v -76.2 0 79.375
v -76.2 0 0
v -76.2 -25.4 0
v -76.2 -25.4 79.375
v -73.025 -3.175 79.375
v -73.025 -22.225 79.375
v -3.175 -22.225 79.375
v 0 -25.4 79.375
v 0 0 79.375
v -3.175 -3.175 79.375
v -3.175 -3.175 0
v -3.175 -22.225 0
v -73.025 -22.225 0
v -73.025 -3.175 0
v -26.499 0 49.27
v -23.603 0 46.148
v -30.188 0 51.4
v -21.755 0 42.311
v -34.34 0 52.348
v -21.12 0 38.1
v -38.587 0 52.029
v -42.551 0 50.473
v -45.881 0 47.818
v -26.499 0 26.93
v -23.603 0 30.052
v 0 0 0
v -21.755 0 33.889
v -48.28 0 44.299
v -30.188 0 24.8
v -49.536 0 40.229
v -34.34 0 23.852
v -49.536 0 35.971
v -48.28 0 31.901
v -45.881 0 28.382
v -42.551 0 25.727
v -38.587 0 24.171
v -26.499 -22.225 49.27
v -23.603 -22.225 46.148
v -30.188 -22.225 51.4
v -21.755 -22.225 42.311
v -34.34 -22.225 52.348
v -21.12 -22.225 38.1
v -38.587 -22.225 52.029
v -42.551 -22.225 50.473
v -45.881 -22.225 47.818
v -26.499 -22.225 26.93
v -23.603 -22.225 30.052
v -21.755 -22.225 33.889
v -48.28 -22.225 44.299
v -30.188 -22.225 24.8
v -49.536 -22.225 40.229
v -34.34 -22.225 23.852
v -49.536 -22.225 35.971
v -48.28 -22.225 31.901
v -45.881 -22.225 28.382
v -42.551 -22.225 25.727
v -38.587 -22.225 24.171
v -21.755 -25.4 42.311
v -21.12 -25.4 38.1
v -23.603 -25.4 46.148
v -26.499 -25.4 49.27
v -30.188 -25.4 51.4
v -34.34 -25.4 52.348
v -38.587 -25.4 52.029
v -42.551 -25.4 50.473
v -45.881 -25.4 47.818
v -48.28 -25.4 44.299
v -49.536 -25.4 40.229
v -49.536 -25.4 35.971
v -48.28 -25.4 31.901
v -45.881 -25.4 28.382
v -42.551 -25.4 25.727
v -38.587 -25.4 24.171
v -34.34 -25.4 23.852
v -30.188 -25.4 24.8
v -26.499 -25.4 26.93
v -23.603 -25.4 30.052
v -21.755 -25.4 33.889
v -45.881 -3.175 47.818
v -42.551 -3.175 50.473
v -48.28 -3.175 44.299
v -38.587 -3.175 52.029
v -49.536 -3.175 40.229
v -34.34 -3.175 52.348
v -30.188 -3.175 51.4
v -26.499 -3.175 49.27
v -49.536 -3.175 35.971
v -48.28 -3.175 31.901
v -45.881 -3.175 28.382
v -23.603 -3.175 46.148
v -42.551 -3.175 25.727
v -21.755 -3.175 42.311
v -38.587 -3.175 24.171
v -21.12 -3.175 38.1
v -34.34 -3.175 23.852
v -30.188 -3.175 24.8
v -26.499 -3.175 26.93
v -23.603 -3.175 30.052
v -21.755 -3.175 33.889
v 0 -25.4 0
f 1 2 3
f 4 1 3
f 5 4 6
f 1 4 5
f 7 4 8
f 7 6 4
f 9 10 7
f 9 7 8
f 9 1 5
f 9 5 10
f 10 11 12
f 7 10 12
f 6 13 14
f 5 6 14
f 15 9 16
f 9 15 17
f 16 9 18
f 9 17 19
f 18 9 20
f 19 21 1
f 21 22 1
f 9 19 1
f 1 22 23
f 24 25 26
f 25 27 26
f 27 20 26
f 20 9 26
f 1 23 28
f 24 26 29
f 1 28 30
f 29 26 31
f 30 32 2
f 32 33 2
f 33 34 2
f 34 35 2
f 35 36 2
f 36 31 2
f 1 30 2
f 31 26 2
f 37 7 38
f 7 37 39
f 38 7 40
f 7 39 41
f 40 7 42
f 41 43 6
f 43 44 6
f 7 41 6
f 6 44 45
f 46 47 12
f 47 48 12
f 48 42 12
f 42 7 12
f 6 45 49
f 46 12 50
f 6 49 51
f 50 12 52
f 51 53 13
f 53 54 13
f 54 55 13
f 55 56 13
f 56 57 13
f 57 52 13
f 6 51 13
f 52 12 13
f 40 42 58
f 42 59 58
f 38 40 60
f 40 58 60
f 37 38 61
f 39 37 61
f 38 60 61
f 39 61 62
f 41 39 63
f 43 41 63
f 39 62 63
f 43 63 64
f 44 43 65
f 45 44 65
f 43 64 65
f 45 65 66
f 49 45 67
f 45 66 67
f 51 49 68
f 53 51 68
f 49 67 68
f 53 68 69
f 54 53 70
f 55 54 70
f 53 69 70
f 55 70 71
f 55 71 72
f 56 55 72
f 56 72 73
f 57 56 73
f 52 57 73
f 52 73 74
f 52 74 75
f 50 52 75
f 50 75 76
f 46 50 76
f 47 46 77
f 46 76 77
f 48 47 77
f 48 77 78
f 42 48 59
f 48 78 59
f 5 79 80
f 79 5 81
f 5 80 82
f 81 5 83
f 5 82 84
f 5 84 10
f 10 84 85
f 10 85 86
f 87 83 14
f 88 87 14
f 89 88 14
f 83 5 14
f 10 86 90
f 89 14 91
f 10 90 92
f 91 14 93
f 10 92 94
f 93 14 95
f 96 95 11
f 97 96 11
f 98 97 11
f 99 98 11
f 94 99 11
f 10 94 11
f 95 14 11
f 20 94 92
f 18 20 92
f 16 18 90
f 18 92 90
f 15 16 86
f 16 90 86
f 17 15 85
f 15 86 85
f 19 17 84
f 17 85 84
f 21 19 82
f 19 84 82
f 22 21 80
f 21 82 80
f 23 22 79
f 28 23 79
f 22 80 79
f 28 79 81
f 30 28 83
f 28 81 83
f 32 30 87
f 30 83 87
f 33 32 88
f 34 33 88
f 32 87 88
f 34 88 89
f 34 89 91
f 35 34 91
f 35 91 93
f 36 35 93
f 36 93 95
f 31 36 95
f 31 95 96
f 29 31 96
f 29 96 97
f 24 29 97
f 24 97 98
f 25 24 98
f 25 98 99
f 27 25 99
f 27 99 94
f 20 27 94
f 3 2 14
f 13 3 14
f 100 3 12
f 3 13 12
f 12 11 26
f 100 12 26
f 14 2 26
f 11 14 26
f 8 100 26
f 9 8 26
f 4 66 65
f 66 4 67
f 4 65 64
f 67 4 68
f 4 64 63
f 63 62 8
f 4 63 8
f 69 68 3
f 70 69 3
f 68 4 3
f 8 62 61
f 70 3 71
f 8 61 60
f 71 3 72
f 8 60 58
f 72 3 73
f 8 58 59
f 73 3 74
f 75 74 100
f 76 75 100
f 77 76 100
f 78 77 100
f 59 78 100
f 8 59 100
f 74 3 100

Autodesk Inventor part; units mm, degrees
ref_plane "YZ Plane" through (0, 0, 0) normal (1, 0, 0) x (0, 1, 0)
ref_plane "XZ Plane" through (0, 0, 0) normal (0, 1, 0) x (-1, 0, 0)
ref_plane "XY Plane" through (0, 0, 0) normal (0, 0, 1) x (1, 0, 0)
sketch "Sketch1" plane through (0, 0, 0) normal (0, 0, 1) x (1, 0, 0)
  line L0 (0, 0) -> (-76.2, 0)
  line L1 (-76.2, 0) -> (-76.2, -25.4)
  line L2 (-76.2, -25.4) -> (0, -25.4)
  line L3 (0, -25.4) -> (0, 0)
  line L4 (-73.025, -22.225) -> (-73.025, -3.175)
  line L5 (-73.025, -3.175) -> (-3.175, -3.175)
  line L6 (-3.175, -3.175) -> (-3.175, -22.225)
  line L7 (-3.175, -22.225) -> (-73.025, -22.225)
  dimension "d0" = 76.2
  dimension "d1" = 25.4
  dimension "d2" = 3.175
extrude "Extrusion1" add sketch "Sketch1" along normal blind 79.375
sketch "Sketch2" plane through (-76.2, -25.4, 0) normal (0, -1, 0) x (1, 0, 0)
  circle A0 centre (40.7924, 38.1) radius 14.2875
  line L0 (0, 0) -> (76.2, 0) projected
  line L1 (76.2, 0) -> (76.2, 79.375) projected
  dimension "d5" = 28.575
  dimension "d6" = 38.1
  dimension "d7" = 35.4076
extrude "Extrusion2" cut sketch "Sketch2" against normal blind 25.4
properties part number "other end support"
